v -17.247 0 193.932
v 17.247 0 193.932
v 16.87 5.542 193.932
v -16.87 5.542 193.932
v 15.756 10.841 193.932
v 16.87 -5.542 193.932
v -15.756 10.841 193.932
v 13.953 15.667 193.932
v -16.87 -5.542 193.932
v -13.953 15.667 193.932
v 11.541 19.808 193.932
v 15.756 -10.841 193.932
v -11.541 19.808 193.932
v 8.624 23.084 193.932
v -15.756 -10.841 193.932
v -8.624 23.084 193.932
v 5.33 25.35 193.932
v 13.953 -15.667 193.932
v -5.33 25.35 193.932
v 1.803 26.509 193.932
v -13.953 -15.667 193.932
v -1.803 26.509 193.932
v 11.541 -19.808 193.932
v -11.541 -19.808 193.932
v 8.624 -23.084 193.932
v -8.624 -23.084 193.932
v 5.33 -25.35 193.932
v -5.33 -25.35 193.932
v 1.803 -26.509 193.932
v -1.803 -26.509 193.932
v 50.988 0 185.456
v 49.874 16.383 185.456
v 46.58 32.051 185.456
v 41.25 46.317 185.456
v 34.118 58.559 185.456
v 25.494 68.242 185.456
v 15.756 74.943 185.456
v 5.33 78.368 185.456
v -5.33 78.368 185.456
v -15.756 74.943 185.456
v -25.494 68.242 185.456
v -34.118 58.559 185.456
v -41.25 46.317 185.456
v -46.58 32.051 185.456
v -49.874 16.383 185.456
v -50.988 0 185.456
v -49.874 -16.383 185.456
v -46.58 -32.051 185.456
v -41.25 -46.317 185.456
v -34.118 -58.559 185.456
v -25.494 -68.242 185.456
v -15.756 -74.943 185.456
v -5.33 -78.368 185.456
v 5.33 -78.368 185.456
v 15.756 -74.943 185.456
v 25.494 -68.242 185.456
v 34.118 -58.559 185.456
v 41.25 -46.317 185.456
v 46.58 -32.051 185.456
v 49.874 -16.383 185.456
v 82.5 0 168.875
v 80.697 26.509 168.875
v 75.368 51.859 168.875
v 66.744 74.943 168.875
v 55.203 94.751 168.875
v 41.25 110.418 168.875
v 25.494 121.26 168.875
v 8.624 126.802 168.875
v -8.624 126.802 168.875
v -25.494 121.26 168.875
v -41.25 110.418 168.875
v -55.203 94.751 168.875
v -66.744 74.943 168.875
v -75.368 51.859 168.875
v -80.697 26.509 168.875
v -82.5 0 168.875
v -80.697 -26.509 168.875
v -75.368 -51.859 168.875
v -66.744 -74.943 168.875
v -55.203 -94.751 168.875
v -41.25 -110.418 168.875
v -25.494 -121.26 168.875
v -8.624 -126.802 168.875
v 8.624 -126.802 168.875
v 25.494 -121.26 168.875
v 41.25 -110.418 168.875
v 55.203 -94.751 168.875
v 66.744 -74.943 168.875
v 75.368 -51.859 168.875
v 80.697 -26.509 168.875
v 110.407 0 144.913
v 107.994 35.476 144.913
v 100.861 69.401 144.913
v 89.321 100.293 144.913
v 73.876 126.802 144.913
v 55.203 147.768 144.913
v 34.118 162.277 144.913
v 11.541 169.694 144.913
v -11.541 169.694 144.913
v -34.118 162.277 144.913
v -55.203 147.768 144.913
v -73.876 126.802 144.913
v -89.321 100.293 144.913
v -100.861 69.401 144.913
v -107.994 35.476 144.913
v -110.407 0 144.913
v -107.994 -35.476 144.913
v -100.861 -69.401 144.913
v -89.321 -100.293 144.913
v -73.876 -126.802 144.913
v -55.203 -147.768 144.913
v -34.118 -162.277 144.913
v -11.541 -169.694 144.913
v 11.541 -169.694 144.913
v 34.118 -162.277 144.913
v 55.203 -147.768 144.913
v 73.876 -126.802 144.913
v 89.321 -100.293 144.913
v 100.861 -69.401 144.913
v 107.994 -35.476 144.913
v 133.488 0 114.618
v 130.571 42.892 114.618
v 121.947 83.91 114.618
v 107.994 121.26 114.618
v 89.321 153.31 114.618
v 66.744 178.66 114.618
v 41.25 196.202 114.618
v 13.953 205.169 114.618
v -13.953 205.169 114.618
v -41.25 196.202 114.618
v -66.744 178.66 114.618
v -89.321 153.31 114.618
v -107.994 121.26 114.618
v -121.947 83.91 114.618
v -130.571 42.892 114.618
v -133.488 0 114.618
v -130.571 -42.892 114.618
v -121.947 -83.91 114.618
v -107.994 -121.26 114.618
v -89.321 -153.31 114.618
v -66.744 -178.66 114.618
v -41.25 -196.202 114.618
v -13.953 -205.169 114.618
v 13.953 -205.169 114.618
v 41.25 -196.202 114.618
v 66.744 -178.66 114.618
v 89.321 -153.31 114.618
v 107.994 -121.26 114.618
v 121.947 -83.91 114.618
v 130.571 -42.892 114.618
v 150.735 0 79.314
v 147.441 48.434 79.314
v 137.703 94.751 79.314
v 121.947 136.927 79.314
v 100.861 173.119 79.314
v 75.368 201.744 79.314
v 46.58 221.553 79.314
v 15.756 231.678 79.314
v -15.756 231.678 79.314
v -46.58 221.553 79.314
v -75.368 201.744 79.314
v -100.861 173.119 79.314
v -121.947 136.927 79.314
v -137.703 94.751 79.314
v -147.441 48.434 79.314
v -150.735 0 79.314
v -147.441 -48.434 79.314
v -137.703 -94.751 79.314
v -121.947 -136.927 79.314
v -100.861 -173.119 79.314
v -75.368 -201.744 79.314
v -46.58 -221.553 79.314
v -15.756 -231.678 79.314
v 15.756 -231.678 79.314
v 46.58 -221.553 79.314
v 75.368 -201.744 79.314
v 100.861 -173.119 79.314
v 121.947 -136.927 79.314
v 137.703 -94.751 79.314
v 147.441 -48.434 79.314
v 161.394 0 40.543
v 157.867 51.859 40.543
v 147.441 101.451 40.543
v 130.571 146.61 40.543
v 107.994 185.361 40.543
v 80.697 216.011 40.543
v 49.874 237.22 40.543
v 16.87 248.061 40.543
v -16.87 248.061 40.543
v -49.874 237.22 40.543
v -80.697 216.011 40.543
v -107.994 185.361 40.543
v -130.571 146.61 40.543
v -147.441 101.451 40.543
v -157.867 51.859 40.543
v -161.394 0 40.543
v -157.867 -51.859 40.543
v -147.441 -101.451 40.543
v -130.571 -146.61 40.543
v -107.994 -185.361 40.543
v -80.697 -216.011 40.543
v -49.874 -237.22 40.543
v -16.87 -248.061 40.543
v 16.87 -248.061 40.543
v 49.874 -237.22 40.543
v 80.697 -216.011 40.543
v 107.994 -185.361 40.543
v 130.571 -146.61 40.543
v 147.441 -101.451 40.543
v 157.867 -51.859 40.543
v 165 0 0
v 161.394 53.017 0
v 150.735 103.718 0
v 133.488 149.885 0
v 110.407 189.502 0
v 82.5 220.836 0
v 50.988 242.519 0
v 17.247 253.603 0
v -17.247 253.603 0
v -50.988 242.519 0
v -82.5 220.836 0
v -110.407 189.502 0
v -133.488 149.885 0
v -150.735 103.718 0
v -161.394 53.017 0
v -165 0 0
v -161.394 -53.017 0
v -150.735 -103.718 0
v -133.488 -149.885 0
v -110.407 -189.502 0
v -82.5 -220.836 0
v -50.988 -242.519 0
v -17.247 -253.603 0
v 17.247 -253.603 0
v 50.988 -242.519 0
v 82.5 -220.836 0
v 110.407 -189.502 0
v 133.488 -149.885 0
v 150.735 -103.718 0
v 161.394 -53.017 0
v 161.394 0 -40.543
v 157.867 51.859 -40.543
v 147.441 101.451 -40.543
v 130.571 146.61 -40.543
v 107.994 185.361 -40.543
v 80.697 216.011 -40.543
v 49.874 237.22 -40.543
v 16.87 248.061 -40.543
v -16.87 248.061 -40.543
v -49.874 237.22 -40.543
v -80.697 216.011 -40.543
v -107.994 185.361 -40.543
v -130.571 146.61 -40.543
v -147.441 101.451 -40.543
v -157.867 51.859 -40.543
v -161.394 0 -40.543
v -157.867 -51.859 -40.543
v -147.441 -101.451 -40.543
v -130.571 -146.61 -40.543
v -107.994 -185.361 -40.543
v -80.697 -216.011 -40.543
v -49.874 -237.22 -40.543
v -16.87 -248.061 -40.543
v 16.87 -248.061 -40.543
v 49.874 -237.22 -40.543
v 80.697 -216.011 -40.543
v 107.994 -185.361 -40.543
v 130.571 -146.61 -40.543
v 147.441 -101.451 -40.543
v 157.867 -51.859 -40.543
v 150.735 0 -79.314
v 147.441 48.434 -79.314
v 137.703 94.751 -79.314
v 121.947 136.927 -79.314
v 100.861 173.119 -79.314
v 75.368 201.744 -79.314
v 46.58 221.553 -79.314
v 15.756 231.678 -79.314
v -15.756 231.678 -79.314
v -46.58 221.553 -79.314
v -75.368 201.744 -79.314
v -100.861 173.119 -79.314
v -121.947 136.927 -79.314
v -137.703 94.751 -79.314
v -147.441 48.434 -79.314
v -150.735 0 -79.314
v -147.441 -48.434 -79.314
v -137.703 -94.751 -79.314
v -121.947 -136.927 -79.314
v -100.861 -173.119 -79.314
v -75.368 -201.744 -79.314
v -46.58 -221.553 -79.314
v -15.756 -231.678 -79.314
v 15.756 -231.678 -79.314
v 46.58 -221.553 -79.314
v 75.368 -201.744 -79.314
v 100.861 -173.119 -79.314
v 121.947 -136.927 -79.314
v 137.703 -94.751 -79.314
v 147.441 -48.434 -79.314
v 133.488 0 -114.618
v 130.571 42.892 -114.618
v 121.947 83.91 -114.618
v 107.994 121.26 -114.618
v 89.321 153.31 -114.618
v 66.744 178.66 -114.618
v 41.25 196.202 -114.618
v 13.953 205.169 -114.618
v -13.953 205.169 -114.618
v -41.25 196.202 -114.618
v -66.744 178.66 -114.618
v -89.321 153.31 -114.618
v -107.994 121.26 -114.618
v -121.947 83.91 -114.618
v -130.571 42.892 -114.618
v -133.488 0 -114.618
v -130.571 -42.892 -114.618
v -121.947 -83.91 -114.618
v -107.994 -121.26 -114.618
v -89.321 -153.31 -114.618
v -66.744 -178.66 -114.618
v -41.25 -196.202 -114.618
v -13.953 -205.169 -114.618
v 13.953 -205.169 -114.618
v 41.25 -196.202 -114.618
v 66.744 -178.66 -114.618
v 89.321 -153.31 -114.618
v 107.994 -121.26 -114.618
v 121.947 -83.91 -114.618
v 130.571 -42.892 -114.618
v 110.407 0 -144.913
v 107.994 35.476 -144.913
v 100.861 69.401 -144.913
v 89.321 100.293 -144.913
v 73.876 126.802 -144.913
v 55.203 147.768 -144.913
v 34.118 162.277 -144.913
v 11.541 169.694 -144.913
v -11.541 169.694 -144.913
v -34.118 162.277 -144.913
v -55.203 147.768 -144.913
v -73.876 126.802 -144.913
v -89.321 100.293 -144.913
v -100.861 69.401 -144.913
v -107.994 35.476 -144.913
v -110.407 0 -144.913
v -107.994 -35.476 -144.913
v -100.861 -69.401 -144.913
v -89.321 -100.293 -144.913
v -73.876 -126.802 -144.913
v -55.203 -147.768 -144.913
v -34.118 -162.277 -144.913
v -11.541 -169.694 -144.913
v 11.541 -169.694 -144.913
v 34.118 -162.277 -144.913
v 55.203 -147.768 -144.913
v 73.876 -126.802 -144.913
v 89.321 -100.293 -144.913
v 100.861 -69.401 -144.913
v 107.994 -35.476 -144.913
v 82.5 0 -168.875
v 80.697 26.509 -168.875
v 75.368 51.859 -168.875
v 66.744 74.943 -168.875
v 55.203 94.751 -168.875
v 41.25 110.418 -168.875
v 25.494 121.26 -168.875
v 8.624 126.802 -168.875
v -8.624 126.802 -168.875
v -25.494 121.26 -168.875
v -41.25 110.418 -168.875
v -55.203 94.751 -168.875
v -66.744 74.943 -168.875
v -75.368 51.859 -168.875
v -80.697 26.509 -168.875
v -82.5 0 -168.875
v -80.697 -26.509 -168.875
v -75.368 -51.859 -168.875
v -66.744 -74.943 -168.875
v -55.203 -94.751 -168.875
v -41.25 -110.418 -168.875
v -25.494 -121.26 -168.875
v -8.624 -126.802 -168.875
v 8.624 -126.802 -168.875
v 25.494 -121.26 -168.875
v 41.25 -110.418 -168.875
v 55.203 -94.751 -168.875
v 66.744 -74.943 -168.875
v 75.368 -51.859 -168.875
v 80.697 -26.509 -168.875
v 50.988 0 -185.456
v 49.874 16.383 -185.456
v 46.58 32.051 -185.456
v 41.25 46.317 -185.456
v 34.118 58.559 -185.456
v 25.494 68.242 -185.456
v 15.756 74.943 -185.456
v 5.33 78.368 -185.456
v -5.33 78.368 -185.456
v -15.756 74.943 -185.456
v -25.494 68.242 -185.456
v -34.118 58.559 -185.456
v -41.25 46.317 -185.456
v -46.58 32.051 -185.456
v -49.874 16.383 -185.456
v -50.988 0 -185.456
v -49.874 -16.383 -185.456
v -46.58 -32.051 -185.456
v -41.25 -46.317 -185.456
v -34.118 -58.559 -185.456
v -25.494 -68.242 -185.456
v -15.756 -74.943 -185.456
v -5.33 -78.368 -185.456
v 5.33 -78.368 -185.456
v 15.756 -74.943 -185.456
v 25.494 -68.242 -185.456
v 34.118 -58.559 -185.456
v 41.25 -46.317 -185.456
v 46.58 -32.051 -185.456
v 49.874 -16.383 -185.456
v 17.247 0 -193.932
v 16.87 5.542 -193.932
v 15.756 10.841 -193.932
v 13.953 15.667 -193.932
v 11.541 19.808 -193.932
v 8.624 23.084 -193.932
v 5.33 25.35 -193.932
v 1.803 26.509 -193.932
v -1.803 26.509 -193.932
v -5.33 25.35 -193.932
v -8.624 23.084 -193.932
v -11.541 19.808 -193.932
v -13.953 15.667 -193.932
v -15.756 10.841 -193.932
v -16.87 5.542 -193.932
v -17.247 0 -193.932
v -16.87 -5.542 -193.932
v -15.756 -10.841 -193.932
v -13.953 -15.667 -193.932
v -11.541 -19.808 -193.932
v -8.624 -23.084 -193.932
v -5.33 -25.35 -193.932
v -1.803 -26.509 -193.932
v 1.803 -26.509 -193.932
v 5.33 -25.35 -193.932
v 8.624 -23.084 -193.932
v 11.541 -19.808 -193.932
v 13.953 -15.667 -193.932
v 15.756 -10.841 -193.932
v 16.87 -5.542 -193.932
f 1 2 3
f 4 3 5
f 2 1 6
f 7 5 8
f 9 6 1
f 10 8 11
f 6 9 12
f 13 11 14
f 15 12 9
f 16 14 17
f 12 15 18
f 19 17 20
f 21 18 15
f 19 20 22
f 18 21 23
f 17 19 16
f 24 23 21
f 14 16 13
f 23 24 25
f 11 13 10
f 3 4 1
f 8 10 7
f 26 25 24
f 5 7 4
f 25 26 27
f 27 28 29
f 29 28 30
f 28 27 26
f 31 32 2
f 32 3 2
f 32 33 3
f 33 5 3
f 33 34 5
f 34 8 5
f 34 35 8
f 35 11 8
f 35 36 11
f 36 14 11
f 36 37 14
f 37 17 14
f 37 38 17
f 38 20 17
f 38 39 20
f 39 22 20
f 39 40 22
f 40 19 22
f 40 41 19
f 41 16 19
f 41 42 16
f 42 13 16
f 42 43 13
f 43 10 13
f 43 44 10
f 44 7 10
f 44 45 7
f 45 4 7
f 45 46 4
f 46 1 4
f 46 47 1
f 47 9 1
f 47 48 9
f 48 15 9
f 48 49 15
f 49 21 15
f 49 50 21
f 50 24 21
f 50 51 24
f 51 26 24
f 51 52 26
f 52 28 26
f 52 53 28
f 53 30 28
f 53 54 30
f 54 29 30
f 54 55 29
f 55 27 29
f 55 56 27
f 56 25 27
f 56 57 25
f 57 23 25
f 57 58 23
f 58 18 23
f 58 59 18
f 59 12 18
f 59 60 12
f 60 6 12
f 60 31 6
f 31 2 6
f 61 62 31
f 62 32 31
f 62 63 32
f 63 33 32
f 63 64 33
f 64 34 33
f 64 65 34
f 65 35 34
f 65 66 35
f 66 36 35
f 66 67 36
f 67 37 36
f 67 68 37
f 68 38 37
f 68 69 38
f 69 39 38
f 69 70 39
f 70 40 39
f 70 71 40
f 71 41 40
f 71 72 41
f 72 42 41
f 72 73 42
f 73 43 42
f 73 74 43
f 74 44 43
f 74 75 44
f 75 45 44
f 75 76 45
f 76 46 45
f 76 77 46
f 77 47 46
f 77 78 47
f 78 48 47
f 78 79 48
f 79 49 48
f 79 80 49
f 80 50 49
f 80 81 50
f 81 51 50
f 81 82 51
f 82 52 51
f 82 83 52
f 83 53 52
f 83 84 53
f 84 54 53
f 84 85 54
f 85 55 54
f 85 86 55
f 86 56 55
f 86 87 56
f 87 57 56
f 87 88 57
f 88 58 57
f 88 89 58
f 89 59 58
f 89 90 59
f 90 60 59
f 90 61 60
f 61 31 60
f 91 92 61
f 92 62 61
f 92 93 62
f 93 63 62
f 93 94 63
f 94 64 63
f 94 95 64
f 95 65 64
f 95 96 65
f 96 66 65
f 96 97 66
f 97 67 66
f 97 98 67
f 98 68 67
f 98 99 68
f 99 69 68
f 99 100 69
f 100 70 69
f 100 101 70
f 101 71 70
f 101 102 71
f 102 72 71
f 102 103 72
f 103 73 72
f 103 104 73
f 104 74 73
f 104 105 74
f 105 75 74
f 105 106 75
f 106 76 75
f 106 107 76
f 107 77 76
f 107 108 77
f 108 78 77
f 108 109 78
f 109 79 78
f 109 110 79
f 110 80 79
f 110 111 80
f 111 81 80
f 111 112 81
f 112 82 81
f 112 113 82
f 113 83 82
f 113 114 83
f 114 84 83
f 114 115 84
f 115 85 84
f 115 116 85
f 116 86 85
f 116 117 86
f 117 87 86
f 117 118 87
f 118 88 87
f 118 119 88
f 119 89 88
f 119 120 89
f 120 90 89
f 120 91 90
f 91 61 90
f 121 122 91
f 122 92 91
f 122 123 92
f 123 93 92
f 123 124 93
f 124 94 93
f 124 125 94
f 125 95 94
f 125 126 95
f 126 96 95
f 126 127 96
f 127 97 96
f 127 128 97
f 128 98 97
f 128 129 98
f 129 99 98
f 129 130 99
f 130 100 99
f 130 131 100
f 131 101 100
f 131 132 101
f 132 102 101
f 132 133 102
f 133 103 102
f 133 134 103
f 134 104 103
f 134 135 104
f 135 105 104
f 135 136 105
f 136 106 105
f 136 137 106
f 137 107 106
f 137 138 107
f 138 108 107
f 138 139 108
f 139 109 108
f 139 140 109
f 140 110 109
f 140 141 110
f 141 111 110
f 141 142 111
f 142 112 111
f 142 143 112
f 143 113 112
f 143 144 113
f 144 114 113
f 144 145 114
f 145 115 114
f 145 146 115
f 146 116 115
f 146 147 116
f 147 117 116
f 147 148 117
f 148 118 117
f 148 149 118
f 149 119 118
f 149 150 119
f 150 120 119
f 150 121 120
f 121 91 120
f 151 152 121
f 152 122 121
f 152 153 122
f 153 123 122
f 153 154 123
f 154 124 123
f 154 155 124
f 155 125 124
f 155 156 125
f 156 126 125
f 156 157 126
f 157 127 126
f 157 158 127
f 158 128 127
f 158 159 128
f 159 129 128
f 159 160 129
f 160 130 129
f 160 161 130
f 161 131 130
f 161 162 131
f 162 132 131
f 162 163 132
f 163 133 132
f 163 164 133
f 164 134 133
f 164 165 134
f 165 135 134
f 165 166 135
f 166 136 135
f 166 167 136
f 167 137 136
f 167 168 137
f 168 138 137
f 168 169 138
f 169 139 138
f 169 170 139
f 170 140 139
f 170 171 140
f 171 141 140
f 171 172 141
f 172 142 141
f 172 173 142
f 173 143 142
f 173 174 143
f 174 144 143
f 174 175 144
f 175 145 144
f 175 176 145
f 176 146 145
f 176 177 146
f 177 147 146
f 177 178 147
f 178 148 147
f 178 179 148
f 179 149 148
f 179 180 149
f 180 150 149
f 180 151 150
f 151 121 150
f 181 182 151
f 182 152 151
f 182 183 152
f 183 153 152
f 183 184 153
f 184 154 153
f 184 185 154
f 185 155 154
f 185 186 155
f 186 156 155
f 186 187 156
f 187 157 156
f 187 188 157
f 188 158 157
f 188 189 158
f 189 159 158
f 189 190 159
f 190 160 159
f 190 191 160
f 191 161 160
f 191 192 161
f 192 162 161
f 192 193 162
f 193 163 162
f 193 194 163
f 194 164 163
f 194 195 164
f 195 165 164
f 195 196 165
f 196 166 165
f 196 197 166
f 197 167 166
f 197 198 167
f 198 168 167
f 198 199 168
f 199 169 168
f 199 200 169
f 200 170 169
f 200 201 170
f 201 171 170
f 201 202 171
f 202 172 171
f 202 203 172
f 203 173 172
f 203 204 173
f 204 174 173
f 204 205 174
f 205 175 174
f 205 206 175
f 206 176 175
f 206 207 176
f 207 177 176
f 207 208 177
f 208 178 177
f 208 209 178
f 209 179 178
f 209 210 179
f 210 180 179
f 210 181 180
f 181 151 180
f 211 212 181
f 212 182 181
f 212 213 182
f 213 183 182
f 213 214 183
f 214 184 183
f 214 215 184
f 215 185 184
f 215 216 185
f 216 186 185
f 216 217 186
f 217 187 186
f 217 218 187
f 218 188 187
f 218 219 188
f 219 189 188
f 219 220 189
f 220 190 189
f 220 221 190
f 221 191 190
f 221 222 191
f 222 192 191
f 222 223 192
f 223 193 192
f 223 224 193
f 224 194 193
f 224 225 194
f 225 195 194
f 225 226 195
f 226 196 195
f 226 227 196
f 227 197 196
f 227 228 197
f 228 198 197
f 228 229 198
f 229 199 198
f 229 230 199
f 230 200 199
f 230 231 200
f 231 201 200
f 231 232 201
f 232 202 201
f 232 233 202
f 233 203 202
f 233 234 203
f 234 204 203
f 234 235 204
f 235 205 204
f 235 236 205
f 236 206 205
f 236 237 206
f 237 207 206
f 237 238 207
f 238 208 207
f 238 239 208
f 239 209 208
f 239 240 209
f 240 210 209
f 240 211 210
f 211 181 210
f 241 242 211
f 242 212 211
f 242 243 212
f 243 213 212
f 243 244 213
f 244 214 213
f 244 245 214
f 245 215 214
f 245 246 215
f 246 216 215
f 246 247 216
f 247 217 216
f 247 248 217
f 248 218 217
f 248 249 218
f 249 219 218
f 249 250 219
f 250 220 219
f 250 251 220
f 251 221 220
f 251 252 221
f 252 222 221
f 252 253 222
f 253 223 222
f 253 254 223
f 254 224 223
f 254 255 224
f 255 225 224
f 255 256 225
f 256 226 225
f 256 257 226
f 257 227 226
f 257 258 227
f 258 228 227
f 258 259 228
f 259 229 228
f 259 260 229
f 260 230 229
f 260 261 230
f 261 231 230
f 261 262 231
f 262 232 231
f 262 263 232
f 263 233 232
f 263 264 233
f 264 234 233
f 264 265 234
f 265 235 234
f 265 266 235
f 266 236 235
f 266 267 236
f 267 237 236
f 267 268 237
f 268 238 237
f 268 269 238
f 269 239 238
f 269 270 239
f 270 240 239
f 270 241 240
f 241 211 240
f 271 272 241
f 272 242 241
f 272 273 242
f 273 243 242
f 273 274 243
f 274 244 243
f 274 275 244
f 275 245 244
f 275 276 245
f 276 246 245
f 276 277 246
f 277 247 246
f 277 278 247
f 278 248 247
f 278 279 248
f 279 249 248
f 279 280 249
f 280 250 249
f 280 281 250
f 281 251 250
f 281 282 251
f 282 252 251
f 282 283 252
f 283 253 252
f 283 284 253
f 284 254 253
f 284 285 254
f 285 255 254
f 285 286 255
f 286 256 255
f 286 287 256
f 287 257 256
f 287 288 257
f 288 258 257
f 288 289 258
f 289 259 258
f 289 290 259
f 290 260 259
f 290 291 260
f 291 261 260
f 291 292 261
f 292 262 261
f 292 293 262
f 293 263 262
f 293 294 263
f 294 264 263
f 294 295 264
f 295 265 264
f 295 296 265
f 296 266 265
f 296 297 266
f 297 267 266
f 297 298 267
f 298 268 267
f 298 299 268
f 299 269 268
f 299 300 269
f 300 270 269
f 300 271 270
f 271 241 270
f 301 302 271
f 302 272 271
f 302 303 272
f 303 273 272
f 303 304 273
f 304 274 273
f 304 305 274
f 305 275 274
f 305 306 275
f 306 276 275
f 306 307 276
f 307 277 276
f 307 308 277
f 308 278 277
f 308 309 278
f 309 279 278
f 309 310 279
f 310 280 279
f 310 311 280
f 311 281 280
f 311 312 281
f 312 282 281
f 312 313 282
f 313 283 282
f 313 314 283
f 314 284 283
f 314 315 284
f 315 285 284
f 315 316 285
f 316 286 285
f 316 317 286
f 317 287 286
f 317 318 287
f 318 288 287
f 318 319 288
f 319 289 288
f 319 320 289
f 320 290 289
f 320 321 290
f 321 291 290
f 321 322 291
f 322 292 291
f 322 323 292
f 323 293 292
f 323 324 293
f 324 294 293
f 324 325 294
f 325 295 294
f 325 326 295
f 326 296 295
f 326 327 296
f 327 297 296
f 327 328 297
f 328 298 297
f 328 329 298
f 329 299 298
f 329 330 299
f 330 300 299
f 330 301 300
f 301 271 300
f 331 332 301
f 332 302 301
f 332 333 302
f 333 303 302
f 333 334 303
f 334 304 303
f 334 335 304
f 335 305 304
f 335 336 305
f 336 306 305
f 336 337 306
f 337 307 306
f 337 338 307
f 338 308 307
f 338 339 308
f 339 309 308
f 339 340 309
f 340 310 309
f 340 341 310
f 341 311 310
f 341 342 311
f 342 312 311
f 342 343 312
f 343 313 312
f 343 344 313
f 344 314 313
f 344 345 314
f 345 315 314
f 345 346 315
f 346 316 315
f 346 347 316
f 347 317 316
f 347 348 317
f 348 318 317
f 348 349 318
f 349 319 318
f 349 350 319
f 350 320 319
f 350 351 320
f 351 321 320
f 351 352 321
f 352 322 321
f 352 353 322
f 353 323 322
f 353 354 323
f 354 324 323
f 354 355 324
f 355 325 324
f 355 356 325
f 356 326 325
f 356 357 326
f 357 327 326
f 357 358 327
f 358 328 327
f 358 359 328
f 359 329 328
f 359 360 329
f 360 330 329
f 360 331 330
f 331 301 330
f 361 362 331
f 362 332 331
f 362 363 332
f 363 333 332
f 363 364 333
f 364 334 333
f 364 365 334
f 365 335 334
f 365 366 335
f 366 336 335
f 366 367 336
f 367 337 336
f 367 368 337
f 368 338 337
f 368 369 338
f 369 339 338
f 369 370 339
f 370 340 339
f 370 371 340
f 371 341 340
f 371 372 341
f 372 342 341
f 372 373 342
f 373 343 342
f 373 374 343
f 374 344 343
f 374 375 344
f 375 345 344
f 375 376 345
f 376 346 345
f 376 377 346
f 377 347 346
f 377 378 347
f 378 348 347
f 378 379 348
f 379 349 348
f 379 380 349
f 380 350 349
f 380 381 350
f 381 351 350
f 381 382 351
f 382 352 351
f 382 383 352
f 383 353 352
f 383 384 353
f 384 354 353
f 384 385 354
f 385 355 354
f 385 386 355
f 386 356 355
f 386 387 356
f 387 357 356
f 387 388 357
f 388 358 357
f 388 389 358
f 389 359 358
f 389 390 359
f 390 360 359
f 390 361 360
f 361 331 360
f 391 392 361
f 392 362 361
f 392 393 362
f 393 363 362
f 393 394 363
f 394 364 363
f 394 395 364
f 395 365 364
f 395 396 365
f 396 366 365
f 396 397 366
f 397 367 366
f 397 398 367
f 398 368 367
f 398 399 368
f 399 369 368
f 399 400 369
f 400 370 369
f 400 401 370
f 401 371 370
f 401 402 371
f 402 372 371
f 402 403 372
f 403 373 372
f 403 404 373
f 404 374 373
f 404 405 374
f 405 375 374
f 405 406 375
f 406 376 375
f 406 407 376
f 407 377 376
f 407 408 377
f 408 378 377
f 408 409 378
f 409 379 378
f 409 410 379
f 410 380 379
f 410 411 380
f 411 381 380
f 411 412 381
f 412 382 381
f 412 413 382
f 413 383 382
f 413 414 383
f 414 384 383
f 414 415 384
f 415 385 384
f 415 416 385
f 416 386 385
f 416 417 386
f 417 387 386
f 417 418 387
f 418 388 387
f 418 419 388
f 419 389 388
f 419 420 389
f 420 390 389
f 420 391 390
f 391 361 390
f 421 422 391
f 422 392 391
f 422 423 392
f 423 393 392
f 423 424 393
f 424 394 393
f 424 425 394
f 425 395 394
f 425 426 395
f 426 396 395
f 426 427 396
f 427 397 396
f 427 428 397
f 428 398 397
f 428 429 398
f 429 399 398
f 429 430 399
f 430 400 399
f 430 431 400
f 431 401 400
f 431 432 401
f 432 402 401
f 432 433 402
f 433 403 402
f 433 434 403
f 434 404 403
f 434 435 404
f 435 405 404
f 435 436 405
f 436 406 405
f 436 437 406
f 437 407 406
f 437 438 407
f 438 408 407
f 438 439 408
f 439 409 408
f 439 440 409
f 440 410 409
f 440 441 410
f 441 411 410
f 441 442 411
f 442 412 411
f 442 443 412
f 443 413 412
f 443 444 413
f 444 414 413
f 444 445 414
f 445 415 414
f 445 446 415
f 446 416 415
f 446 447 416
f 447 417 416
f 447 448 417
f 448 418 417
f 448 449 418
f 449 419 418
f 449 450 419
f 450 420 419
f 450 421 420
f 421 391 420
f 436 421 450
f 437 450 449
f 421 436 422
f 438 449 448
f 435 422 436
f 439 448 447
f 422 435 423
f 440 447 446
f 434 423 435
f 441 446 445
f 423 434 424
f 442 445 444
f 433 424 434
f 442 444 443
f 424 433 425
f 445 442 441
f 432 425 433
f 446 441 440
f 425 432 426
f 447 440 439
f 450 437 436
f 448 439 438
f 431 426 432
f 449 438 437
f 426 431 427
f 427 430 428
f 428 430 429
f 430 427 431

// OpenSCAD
// Generated by SolidPython 1.0.1 on 2020-07-29 00:46:50


scale(v = [11, 17, 13]) {
	sphere(r = 15);
}
/***********************************************
*********      SolidPython code:      **********
************************************************
 
# import packages: SolidPython
from solid import *
from solid.utils import *
from itertools import chain, combinations, permutations


class Resize:

    def __init__(self, scad_file):
        self.scad_file = scad_file
        #self.scad_file = import_scad(scad_file)
        # cone/cylinder param:
        self.r1 = 0
        self.r2 = 0
        self.h = 0
        # rectangular prism param:
        self.w = 0
        self.l = 0
        # ellipse param:
        self.r = 0

    # import OpenScad code (file name corresponds to shape)


    # classify shape + parameters
    def assign(self, param1, param2, param3):
        if self.scad_file == 'cone.scad':
            self.r1 = param1
            self.r2 = param2
            self.h = param3
        elif self.scad_file == 'cylinder.scad':
            self.r1 = param1
            self.r2 = param2
            self.h = param3
        elif self.scad_file == 'rectangularPrism.scad':
            self.h = param1
            self.l = param2
            self.w = param3
        else:
            self.r = param1
            self.h = param2

    # resize parameters
    def iterate(self):
        x = range(3, 20, 2)
        i = 1
        if self.scad_file == 'cone.scad':
            tempList = list(permutations(x, 2))
            for temp in tempList:
                param1 = temp[0]
                param2 = temp[1]
                filepath = 'produced_scad_files/' + 'cone' + str(param1) + '_' + str(param2) + '_' + '.scad'
                scad_render_to_file(cylinder(h=param1, r1=param2, r2=0), filepath)

        elif self.scad_file == 'cylinder.scad':
            tempList = list(permutations(x, 3))
            for temp in tempList:
                param1 = temp[0]
                param2 = temp[1]
                filepath = 'produced_scad_files/' + 'cylinder' + str(param1) + '_' + str(param2) + '_' + '.scad'
                scad_render_to_file(cylinder(h=param1, r1=param2, r2=param2), filepath)

        elif self.scad_file == 'rectangularPrism.scad':
            tempList = list(permutations(x, 3))
            for temp in tempList:
                param1 = temp[0]
                param2 = temp[1]
                param3 = temp[2]
                filepath = 'produced_scad_files/' + 'rectangularPrism' + str(param1) + '_' + str(param2) + '_' + str(
                    param3) + '.scad'
                scad_render_to_file(cube(size=(param1, param2, param3)), filepath)

        elif self.scad_file == 'ellipse.scad':
            tempList = list(permutations(x, 4))
            for temp in tempList:
                param1 = temp[0]
                param2 = temp[1]
                param3 = temp[2]
                param4 = temp[3]
                filepath = 'produced_scad_files/' + 'ellipse' + str(param1) + '_' + str(param2) + '_' + str(param3) + '_' + str(param4) + '.scad'
                scad_render_to_file(scale([param1, param2, param3])(sphere(r=param4)), filepath)

    def render_to_scadfile(self):
        scad_render_to_file(scad, 'example.scad') 
 
************************************************/
